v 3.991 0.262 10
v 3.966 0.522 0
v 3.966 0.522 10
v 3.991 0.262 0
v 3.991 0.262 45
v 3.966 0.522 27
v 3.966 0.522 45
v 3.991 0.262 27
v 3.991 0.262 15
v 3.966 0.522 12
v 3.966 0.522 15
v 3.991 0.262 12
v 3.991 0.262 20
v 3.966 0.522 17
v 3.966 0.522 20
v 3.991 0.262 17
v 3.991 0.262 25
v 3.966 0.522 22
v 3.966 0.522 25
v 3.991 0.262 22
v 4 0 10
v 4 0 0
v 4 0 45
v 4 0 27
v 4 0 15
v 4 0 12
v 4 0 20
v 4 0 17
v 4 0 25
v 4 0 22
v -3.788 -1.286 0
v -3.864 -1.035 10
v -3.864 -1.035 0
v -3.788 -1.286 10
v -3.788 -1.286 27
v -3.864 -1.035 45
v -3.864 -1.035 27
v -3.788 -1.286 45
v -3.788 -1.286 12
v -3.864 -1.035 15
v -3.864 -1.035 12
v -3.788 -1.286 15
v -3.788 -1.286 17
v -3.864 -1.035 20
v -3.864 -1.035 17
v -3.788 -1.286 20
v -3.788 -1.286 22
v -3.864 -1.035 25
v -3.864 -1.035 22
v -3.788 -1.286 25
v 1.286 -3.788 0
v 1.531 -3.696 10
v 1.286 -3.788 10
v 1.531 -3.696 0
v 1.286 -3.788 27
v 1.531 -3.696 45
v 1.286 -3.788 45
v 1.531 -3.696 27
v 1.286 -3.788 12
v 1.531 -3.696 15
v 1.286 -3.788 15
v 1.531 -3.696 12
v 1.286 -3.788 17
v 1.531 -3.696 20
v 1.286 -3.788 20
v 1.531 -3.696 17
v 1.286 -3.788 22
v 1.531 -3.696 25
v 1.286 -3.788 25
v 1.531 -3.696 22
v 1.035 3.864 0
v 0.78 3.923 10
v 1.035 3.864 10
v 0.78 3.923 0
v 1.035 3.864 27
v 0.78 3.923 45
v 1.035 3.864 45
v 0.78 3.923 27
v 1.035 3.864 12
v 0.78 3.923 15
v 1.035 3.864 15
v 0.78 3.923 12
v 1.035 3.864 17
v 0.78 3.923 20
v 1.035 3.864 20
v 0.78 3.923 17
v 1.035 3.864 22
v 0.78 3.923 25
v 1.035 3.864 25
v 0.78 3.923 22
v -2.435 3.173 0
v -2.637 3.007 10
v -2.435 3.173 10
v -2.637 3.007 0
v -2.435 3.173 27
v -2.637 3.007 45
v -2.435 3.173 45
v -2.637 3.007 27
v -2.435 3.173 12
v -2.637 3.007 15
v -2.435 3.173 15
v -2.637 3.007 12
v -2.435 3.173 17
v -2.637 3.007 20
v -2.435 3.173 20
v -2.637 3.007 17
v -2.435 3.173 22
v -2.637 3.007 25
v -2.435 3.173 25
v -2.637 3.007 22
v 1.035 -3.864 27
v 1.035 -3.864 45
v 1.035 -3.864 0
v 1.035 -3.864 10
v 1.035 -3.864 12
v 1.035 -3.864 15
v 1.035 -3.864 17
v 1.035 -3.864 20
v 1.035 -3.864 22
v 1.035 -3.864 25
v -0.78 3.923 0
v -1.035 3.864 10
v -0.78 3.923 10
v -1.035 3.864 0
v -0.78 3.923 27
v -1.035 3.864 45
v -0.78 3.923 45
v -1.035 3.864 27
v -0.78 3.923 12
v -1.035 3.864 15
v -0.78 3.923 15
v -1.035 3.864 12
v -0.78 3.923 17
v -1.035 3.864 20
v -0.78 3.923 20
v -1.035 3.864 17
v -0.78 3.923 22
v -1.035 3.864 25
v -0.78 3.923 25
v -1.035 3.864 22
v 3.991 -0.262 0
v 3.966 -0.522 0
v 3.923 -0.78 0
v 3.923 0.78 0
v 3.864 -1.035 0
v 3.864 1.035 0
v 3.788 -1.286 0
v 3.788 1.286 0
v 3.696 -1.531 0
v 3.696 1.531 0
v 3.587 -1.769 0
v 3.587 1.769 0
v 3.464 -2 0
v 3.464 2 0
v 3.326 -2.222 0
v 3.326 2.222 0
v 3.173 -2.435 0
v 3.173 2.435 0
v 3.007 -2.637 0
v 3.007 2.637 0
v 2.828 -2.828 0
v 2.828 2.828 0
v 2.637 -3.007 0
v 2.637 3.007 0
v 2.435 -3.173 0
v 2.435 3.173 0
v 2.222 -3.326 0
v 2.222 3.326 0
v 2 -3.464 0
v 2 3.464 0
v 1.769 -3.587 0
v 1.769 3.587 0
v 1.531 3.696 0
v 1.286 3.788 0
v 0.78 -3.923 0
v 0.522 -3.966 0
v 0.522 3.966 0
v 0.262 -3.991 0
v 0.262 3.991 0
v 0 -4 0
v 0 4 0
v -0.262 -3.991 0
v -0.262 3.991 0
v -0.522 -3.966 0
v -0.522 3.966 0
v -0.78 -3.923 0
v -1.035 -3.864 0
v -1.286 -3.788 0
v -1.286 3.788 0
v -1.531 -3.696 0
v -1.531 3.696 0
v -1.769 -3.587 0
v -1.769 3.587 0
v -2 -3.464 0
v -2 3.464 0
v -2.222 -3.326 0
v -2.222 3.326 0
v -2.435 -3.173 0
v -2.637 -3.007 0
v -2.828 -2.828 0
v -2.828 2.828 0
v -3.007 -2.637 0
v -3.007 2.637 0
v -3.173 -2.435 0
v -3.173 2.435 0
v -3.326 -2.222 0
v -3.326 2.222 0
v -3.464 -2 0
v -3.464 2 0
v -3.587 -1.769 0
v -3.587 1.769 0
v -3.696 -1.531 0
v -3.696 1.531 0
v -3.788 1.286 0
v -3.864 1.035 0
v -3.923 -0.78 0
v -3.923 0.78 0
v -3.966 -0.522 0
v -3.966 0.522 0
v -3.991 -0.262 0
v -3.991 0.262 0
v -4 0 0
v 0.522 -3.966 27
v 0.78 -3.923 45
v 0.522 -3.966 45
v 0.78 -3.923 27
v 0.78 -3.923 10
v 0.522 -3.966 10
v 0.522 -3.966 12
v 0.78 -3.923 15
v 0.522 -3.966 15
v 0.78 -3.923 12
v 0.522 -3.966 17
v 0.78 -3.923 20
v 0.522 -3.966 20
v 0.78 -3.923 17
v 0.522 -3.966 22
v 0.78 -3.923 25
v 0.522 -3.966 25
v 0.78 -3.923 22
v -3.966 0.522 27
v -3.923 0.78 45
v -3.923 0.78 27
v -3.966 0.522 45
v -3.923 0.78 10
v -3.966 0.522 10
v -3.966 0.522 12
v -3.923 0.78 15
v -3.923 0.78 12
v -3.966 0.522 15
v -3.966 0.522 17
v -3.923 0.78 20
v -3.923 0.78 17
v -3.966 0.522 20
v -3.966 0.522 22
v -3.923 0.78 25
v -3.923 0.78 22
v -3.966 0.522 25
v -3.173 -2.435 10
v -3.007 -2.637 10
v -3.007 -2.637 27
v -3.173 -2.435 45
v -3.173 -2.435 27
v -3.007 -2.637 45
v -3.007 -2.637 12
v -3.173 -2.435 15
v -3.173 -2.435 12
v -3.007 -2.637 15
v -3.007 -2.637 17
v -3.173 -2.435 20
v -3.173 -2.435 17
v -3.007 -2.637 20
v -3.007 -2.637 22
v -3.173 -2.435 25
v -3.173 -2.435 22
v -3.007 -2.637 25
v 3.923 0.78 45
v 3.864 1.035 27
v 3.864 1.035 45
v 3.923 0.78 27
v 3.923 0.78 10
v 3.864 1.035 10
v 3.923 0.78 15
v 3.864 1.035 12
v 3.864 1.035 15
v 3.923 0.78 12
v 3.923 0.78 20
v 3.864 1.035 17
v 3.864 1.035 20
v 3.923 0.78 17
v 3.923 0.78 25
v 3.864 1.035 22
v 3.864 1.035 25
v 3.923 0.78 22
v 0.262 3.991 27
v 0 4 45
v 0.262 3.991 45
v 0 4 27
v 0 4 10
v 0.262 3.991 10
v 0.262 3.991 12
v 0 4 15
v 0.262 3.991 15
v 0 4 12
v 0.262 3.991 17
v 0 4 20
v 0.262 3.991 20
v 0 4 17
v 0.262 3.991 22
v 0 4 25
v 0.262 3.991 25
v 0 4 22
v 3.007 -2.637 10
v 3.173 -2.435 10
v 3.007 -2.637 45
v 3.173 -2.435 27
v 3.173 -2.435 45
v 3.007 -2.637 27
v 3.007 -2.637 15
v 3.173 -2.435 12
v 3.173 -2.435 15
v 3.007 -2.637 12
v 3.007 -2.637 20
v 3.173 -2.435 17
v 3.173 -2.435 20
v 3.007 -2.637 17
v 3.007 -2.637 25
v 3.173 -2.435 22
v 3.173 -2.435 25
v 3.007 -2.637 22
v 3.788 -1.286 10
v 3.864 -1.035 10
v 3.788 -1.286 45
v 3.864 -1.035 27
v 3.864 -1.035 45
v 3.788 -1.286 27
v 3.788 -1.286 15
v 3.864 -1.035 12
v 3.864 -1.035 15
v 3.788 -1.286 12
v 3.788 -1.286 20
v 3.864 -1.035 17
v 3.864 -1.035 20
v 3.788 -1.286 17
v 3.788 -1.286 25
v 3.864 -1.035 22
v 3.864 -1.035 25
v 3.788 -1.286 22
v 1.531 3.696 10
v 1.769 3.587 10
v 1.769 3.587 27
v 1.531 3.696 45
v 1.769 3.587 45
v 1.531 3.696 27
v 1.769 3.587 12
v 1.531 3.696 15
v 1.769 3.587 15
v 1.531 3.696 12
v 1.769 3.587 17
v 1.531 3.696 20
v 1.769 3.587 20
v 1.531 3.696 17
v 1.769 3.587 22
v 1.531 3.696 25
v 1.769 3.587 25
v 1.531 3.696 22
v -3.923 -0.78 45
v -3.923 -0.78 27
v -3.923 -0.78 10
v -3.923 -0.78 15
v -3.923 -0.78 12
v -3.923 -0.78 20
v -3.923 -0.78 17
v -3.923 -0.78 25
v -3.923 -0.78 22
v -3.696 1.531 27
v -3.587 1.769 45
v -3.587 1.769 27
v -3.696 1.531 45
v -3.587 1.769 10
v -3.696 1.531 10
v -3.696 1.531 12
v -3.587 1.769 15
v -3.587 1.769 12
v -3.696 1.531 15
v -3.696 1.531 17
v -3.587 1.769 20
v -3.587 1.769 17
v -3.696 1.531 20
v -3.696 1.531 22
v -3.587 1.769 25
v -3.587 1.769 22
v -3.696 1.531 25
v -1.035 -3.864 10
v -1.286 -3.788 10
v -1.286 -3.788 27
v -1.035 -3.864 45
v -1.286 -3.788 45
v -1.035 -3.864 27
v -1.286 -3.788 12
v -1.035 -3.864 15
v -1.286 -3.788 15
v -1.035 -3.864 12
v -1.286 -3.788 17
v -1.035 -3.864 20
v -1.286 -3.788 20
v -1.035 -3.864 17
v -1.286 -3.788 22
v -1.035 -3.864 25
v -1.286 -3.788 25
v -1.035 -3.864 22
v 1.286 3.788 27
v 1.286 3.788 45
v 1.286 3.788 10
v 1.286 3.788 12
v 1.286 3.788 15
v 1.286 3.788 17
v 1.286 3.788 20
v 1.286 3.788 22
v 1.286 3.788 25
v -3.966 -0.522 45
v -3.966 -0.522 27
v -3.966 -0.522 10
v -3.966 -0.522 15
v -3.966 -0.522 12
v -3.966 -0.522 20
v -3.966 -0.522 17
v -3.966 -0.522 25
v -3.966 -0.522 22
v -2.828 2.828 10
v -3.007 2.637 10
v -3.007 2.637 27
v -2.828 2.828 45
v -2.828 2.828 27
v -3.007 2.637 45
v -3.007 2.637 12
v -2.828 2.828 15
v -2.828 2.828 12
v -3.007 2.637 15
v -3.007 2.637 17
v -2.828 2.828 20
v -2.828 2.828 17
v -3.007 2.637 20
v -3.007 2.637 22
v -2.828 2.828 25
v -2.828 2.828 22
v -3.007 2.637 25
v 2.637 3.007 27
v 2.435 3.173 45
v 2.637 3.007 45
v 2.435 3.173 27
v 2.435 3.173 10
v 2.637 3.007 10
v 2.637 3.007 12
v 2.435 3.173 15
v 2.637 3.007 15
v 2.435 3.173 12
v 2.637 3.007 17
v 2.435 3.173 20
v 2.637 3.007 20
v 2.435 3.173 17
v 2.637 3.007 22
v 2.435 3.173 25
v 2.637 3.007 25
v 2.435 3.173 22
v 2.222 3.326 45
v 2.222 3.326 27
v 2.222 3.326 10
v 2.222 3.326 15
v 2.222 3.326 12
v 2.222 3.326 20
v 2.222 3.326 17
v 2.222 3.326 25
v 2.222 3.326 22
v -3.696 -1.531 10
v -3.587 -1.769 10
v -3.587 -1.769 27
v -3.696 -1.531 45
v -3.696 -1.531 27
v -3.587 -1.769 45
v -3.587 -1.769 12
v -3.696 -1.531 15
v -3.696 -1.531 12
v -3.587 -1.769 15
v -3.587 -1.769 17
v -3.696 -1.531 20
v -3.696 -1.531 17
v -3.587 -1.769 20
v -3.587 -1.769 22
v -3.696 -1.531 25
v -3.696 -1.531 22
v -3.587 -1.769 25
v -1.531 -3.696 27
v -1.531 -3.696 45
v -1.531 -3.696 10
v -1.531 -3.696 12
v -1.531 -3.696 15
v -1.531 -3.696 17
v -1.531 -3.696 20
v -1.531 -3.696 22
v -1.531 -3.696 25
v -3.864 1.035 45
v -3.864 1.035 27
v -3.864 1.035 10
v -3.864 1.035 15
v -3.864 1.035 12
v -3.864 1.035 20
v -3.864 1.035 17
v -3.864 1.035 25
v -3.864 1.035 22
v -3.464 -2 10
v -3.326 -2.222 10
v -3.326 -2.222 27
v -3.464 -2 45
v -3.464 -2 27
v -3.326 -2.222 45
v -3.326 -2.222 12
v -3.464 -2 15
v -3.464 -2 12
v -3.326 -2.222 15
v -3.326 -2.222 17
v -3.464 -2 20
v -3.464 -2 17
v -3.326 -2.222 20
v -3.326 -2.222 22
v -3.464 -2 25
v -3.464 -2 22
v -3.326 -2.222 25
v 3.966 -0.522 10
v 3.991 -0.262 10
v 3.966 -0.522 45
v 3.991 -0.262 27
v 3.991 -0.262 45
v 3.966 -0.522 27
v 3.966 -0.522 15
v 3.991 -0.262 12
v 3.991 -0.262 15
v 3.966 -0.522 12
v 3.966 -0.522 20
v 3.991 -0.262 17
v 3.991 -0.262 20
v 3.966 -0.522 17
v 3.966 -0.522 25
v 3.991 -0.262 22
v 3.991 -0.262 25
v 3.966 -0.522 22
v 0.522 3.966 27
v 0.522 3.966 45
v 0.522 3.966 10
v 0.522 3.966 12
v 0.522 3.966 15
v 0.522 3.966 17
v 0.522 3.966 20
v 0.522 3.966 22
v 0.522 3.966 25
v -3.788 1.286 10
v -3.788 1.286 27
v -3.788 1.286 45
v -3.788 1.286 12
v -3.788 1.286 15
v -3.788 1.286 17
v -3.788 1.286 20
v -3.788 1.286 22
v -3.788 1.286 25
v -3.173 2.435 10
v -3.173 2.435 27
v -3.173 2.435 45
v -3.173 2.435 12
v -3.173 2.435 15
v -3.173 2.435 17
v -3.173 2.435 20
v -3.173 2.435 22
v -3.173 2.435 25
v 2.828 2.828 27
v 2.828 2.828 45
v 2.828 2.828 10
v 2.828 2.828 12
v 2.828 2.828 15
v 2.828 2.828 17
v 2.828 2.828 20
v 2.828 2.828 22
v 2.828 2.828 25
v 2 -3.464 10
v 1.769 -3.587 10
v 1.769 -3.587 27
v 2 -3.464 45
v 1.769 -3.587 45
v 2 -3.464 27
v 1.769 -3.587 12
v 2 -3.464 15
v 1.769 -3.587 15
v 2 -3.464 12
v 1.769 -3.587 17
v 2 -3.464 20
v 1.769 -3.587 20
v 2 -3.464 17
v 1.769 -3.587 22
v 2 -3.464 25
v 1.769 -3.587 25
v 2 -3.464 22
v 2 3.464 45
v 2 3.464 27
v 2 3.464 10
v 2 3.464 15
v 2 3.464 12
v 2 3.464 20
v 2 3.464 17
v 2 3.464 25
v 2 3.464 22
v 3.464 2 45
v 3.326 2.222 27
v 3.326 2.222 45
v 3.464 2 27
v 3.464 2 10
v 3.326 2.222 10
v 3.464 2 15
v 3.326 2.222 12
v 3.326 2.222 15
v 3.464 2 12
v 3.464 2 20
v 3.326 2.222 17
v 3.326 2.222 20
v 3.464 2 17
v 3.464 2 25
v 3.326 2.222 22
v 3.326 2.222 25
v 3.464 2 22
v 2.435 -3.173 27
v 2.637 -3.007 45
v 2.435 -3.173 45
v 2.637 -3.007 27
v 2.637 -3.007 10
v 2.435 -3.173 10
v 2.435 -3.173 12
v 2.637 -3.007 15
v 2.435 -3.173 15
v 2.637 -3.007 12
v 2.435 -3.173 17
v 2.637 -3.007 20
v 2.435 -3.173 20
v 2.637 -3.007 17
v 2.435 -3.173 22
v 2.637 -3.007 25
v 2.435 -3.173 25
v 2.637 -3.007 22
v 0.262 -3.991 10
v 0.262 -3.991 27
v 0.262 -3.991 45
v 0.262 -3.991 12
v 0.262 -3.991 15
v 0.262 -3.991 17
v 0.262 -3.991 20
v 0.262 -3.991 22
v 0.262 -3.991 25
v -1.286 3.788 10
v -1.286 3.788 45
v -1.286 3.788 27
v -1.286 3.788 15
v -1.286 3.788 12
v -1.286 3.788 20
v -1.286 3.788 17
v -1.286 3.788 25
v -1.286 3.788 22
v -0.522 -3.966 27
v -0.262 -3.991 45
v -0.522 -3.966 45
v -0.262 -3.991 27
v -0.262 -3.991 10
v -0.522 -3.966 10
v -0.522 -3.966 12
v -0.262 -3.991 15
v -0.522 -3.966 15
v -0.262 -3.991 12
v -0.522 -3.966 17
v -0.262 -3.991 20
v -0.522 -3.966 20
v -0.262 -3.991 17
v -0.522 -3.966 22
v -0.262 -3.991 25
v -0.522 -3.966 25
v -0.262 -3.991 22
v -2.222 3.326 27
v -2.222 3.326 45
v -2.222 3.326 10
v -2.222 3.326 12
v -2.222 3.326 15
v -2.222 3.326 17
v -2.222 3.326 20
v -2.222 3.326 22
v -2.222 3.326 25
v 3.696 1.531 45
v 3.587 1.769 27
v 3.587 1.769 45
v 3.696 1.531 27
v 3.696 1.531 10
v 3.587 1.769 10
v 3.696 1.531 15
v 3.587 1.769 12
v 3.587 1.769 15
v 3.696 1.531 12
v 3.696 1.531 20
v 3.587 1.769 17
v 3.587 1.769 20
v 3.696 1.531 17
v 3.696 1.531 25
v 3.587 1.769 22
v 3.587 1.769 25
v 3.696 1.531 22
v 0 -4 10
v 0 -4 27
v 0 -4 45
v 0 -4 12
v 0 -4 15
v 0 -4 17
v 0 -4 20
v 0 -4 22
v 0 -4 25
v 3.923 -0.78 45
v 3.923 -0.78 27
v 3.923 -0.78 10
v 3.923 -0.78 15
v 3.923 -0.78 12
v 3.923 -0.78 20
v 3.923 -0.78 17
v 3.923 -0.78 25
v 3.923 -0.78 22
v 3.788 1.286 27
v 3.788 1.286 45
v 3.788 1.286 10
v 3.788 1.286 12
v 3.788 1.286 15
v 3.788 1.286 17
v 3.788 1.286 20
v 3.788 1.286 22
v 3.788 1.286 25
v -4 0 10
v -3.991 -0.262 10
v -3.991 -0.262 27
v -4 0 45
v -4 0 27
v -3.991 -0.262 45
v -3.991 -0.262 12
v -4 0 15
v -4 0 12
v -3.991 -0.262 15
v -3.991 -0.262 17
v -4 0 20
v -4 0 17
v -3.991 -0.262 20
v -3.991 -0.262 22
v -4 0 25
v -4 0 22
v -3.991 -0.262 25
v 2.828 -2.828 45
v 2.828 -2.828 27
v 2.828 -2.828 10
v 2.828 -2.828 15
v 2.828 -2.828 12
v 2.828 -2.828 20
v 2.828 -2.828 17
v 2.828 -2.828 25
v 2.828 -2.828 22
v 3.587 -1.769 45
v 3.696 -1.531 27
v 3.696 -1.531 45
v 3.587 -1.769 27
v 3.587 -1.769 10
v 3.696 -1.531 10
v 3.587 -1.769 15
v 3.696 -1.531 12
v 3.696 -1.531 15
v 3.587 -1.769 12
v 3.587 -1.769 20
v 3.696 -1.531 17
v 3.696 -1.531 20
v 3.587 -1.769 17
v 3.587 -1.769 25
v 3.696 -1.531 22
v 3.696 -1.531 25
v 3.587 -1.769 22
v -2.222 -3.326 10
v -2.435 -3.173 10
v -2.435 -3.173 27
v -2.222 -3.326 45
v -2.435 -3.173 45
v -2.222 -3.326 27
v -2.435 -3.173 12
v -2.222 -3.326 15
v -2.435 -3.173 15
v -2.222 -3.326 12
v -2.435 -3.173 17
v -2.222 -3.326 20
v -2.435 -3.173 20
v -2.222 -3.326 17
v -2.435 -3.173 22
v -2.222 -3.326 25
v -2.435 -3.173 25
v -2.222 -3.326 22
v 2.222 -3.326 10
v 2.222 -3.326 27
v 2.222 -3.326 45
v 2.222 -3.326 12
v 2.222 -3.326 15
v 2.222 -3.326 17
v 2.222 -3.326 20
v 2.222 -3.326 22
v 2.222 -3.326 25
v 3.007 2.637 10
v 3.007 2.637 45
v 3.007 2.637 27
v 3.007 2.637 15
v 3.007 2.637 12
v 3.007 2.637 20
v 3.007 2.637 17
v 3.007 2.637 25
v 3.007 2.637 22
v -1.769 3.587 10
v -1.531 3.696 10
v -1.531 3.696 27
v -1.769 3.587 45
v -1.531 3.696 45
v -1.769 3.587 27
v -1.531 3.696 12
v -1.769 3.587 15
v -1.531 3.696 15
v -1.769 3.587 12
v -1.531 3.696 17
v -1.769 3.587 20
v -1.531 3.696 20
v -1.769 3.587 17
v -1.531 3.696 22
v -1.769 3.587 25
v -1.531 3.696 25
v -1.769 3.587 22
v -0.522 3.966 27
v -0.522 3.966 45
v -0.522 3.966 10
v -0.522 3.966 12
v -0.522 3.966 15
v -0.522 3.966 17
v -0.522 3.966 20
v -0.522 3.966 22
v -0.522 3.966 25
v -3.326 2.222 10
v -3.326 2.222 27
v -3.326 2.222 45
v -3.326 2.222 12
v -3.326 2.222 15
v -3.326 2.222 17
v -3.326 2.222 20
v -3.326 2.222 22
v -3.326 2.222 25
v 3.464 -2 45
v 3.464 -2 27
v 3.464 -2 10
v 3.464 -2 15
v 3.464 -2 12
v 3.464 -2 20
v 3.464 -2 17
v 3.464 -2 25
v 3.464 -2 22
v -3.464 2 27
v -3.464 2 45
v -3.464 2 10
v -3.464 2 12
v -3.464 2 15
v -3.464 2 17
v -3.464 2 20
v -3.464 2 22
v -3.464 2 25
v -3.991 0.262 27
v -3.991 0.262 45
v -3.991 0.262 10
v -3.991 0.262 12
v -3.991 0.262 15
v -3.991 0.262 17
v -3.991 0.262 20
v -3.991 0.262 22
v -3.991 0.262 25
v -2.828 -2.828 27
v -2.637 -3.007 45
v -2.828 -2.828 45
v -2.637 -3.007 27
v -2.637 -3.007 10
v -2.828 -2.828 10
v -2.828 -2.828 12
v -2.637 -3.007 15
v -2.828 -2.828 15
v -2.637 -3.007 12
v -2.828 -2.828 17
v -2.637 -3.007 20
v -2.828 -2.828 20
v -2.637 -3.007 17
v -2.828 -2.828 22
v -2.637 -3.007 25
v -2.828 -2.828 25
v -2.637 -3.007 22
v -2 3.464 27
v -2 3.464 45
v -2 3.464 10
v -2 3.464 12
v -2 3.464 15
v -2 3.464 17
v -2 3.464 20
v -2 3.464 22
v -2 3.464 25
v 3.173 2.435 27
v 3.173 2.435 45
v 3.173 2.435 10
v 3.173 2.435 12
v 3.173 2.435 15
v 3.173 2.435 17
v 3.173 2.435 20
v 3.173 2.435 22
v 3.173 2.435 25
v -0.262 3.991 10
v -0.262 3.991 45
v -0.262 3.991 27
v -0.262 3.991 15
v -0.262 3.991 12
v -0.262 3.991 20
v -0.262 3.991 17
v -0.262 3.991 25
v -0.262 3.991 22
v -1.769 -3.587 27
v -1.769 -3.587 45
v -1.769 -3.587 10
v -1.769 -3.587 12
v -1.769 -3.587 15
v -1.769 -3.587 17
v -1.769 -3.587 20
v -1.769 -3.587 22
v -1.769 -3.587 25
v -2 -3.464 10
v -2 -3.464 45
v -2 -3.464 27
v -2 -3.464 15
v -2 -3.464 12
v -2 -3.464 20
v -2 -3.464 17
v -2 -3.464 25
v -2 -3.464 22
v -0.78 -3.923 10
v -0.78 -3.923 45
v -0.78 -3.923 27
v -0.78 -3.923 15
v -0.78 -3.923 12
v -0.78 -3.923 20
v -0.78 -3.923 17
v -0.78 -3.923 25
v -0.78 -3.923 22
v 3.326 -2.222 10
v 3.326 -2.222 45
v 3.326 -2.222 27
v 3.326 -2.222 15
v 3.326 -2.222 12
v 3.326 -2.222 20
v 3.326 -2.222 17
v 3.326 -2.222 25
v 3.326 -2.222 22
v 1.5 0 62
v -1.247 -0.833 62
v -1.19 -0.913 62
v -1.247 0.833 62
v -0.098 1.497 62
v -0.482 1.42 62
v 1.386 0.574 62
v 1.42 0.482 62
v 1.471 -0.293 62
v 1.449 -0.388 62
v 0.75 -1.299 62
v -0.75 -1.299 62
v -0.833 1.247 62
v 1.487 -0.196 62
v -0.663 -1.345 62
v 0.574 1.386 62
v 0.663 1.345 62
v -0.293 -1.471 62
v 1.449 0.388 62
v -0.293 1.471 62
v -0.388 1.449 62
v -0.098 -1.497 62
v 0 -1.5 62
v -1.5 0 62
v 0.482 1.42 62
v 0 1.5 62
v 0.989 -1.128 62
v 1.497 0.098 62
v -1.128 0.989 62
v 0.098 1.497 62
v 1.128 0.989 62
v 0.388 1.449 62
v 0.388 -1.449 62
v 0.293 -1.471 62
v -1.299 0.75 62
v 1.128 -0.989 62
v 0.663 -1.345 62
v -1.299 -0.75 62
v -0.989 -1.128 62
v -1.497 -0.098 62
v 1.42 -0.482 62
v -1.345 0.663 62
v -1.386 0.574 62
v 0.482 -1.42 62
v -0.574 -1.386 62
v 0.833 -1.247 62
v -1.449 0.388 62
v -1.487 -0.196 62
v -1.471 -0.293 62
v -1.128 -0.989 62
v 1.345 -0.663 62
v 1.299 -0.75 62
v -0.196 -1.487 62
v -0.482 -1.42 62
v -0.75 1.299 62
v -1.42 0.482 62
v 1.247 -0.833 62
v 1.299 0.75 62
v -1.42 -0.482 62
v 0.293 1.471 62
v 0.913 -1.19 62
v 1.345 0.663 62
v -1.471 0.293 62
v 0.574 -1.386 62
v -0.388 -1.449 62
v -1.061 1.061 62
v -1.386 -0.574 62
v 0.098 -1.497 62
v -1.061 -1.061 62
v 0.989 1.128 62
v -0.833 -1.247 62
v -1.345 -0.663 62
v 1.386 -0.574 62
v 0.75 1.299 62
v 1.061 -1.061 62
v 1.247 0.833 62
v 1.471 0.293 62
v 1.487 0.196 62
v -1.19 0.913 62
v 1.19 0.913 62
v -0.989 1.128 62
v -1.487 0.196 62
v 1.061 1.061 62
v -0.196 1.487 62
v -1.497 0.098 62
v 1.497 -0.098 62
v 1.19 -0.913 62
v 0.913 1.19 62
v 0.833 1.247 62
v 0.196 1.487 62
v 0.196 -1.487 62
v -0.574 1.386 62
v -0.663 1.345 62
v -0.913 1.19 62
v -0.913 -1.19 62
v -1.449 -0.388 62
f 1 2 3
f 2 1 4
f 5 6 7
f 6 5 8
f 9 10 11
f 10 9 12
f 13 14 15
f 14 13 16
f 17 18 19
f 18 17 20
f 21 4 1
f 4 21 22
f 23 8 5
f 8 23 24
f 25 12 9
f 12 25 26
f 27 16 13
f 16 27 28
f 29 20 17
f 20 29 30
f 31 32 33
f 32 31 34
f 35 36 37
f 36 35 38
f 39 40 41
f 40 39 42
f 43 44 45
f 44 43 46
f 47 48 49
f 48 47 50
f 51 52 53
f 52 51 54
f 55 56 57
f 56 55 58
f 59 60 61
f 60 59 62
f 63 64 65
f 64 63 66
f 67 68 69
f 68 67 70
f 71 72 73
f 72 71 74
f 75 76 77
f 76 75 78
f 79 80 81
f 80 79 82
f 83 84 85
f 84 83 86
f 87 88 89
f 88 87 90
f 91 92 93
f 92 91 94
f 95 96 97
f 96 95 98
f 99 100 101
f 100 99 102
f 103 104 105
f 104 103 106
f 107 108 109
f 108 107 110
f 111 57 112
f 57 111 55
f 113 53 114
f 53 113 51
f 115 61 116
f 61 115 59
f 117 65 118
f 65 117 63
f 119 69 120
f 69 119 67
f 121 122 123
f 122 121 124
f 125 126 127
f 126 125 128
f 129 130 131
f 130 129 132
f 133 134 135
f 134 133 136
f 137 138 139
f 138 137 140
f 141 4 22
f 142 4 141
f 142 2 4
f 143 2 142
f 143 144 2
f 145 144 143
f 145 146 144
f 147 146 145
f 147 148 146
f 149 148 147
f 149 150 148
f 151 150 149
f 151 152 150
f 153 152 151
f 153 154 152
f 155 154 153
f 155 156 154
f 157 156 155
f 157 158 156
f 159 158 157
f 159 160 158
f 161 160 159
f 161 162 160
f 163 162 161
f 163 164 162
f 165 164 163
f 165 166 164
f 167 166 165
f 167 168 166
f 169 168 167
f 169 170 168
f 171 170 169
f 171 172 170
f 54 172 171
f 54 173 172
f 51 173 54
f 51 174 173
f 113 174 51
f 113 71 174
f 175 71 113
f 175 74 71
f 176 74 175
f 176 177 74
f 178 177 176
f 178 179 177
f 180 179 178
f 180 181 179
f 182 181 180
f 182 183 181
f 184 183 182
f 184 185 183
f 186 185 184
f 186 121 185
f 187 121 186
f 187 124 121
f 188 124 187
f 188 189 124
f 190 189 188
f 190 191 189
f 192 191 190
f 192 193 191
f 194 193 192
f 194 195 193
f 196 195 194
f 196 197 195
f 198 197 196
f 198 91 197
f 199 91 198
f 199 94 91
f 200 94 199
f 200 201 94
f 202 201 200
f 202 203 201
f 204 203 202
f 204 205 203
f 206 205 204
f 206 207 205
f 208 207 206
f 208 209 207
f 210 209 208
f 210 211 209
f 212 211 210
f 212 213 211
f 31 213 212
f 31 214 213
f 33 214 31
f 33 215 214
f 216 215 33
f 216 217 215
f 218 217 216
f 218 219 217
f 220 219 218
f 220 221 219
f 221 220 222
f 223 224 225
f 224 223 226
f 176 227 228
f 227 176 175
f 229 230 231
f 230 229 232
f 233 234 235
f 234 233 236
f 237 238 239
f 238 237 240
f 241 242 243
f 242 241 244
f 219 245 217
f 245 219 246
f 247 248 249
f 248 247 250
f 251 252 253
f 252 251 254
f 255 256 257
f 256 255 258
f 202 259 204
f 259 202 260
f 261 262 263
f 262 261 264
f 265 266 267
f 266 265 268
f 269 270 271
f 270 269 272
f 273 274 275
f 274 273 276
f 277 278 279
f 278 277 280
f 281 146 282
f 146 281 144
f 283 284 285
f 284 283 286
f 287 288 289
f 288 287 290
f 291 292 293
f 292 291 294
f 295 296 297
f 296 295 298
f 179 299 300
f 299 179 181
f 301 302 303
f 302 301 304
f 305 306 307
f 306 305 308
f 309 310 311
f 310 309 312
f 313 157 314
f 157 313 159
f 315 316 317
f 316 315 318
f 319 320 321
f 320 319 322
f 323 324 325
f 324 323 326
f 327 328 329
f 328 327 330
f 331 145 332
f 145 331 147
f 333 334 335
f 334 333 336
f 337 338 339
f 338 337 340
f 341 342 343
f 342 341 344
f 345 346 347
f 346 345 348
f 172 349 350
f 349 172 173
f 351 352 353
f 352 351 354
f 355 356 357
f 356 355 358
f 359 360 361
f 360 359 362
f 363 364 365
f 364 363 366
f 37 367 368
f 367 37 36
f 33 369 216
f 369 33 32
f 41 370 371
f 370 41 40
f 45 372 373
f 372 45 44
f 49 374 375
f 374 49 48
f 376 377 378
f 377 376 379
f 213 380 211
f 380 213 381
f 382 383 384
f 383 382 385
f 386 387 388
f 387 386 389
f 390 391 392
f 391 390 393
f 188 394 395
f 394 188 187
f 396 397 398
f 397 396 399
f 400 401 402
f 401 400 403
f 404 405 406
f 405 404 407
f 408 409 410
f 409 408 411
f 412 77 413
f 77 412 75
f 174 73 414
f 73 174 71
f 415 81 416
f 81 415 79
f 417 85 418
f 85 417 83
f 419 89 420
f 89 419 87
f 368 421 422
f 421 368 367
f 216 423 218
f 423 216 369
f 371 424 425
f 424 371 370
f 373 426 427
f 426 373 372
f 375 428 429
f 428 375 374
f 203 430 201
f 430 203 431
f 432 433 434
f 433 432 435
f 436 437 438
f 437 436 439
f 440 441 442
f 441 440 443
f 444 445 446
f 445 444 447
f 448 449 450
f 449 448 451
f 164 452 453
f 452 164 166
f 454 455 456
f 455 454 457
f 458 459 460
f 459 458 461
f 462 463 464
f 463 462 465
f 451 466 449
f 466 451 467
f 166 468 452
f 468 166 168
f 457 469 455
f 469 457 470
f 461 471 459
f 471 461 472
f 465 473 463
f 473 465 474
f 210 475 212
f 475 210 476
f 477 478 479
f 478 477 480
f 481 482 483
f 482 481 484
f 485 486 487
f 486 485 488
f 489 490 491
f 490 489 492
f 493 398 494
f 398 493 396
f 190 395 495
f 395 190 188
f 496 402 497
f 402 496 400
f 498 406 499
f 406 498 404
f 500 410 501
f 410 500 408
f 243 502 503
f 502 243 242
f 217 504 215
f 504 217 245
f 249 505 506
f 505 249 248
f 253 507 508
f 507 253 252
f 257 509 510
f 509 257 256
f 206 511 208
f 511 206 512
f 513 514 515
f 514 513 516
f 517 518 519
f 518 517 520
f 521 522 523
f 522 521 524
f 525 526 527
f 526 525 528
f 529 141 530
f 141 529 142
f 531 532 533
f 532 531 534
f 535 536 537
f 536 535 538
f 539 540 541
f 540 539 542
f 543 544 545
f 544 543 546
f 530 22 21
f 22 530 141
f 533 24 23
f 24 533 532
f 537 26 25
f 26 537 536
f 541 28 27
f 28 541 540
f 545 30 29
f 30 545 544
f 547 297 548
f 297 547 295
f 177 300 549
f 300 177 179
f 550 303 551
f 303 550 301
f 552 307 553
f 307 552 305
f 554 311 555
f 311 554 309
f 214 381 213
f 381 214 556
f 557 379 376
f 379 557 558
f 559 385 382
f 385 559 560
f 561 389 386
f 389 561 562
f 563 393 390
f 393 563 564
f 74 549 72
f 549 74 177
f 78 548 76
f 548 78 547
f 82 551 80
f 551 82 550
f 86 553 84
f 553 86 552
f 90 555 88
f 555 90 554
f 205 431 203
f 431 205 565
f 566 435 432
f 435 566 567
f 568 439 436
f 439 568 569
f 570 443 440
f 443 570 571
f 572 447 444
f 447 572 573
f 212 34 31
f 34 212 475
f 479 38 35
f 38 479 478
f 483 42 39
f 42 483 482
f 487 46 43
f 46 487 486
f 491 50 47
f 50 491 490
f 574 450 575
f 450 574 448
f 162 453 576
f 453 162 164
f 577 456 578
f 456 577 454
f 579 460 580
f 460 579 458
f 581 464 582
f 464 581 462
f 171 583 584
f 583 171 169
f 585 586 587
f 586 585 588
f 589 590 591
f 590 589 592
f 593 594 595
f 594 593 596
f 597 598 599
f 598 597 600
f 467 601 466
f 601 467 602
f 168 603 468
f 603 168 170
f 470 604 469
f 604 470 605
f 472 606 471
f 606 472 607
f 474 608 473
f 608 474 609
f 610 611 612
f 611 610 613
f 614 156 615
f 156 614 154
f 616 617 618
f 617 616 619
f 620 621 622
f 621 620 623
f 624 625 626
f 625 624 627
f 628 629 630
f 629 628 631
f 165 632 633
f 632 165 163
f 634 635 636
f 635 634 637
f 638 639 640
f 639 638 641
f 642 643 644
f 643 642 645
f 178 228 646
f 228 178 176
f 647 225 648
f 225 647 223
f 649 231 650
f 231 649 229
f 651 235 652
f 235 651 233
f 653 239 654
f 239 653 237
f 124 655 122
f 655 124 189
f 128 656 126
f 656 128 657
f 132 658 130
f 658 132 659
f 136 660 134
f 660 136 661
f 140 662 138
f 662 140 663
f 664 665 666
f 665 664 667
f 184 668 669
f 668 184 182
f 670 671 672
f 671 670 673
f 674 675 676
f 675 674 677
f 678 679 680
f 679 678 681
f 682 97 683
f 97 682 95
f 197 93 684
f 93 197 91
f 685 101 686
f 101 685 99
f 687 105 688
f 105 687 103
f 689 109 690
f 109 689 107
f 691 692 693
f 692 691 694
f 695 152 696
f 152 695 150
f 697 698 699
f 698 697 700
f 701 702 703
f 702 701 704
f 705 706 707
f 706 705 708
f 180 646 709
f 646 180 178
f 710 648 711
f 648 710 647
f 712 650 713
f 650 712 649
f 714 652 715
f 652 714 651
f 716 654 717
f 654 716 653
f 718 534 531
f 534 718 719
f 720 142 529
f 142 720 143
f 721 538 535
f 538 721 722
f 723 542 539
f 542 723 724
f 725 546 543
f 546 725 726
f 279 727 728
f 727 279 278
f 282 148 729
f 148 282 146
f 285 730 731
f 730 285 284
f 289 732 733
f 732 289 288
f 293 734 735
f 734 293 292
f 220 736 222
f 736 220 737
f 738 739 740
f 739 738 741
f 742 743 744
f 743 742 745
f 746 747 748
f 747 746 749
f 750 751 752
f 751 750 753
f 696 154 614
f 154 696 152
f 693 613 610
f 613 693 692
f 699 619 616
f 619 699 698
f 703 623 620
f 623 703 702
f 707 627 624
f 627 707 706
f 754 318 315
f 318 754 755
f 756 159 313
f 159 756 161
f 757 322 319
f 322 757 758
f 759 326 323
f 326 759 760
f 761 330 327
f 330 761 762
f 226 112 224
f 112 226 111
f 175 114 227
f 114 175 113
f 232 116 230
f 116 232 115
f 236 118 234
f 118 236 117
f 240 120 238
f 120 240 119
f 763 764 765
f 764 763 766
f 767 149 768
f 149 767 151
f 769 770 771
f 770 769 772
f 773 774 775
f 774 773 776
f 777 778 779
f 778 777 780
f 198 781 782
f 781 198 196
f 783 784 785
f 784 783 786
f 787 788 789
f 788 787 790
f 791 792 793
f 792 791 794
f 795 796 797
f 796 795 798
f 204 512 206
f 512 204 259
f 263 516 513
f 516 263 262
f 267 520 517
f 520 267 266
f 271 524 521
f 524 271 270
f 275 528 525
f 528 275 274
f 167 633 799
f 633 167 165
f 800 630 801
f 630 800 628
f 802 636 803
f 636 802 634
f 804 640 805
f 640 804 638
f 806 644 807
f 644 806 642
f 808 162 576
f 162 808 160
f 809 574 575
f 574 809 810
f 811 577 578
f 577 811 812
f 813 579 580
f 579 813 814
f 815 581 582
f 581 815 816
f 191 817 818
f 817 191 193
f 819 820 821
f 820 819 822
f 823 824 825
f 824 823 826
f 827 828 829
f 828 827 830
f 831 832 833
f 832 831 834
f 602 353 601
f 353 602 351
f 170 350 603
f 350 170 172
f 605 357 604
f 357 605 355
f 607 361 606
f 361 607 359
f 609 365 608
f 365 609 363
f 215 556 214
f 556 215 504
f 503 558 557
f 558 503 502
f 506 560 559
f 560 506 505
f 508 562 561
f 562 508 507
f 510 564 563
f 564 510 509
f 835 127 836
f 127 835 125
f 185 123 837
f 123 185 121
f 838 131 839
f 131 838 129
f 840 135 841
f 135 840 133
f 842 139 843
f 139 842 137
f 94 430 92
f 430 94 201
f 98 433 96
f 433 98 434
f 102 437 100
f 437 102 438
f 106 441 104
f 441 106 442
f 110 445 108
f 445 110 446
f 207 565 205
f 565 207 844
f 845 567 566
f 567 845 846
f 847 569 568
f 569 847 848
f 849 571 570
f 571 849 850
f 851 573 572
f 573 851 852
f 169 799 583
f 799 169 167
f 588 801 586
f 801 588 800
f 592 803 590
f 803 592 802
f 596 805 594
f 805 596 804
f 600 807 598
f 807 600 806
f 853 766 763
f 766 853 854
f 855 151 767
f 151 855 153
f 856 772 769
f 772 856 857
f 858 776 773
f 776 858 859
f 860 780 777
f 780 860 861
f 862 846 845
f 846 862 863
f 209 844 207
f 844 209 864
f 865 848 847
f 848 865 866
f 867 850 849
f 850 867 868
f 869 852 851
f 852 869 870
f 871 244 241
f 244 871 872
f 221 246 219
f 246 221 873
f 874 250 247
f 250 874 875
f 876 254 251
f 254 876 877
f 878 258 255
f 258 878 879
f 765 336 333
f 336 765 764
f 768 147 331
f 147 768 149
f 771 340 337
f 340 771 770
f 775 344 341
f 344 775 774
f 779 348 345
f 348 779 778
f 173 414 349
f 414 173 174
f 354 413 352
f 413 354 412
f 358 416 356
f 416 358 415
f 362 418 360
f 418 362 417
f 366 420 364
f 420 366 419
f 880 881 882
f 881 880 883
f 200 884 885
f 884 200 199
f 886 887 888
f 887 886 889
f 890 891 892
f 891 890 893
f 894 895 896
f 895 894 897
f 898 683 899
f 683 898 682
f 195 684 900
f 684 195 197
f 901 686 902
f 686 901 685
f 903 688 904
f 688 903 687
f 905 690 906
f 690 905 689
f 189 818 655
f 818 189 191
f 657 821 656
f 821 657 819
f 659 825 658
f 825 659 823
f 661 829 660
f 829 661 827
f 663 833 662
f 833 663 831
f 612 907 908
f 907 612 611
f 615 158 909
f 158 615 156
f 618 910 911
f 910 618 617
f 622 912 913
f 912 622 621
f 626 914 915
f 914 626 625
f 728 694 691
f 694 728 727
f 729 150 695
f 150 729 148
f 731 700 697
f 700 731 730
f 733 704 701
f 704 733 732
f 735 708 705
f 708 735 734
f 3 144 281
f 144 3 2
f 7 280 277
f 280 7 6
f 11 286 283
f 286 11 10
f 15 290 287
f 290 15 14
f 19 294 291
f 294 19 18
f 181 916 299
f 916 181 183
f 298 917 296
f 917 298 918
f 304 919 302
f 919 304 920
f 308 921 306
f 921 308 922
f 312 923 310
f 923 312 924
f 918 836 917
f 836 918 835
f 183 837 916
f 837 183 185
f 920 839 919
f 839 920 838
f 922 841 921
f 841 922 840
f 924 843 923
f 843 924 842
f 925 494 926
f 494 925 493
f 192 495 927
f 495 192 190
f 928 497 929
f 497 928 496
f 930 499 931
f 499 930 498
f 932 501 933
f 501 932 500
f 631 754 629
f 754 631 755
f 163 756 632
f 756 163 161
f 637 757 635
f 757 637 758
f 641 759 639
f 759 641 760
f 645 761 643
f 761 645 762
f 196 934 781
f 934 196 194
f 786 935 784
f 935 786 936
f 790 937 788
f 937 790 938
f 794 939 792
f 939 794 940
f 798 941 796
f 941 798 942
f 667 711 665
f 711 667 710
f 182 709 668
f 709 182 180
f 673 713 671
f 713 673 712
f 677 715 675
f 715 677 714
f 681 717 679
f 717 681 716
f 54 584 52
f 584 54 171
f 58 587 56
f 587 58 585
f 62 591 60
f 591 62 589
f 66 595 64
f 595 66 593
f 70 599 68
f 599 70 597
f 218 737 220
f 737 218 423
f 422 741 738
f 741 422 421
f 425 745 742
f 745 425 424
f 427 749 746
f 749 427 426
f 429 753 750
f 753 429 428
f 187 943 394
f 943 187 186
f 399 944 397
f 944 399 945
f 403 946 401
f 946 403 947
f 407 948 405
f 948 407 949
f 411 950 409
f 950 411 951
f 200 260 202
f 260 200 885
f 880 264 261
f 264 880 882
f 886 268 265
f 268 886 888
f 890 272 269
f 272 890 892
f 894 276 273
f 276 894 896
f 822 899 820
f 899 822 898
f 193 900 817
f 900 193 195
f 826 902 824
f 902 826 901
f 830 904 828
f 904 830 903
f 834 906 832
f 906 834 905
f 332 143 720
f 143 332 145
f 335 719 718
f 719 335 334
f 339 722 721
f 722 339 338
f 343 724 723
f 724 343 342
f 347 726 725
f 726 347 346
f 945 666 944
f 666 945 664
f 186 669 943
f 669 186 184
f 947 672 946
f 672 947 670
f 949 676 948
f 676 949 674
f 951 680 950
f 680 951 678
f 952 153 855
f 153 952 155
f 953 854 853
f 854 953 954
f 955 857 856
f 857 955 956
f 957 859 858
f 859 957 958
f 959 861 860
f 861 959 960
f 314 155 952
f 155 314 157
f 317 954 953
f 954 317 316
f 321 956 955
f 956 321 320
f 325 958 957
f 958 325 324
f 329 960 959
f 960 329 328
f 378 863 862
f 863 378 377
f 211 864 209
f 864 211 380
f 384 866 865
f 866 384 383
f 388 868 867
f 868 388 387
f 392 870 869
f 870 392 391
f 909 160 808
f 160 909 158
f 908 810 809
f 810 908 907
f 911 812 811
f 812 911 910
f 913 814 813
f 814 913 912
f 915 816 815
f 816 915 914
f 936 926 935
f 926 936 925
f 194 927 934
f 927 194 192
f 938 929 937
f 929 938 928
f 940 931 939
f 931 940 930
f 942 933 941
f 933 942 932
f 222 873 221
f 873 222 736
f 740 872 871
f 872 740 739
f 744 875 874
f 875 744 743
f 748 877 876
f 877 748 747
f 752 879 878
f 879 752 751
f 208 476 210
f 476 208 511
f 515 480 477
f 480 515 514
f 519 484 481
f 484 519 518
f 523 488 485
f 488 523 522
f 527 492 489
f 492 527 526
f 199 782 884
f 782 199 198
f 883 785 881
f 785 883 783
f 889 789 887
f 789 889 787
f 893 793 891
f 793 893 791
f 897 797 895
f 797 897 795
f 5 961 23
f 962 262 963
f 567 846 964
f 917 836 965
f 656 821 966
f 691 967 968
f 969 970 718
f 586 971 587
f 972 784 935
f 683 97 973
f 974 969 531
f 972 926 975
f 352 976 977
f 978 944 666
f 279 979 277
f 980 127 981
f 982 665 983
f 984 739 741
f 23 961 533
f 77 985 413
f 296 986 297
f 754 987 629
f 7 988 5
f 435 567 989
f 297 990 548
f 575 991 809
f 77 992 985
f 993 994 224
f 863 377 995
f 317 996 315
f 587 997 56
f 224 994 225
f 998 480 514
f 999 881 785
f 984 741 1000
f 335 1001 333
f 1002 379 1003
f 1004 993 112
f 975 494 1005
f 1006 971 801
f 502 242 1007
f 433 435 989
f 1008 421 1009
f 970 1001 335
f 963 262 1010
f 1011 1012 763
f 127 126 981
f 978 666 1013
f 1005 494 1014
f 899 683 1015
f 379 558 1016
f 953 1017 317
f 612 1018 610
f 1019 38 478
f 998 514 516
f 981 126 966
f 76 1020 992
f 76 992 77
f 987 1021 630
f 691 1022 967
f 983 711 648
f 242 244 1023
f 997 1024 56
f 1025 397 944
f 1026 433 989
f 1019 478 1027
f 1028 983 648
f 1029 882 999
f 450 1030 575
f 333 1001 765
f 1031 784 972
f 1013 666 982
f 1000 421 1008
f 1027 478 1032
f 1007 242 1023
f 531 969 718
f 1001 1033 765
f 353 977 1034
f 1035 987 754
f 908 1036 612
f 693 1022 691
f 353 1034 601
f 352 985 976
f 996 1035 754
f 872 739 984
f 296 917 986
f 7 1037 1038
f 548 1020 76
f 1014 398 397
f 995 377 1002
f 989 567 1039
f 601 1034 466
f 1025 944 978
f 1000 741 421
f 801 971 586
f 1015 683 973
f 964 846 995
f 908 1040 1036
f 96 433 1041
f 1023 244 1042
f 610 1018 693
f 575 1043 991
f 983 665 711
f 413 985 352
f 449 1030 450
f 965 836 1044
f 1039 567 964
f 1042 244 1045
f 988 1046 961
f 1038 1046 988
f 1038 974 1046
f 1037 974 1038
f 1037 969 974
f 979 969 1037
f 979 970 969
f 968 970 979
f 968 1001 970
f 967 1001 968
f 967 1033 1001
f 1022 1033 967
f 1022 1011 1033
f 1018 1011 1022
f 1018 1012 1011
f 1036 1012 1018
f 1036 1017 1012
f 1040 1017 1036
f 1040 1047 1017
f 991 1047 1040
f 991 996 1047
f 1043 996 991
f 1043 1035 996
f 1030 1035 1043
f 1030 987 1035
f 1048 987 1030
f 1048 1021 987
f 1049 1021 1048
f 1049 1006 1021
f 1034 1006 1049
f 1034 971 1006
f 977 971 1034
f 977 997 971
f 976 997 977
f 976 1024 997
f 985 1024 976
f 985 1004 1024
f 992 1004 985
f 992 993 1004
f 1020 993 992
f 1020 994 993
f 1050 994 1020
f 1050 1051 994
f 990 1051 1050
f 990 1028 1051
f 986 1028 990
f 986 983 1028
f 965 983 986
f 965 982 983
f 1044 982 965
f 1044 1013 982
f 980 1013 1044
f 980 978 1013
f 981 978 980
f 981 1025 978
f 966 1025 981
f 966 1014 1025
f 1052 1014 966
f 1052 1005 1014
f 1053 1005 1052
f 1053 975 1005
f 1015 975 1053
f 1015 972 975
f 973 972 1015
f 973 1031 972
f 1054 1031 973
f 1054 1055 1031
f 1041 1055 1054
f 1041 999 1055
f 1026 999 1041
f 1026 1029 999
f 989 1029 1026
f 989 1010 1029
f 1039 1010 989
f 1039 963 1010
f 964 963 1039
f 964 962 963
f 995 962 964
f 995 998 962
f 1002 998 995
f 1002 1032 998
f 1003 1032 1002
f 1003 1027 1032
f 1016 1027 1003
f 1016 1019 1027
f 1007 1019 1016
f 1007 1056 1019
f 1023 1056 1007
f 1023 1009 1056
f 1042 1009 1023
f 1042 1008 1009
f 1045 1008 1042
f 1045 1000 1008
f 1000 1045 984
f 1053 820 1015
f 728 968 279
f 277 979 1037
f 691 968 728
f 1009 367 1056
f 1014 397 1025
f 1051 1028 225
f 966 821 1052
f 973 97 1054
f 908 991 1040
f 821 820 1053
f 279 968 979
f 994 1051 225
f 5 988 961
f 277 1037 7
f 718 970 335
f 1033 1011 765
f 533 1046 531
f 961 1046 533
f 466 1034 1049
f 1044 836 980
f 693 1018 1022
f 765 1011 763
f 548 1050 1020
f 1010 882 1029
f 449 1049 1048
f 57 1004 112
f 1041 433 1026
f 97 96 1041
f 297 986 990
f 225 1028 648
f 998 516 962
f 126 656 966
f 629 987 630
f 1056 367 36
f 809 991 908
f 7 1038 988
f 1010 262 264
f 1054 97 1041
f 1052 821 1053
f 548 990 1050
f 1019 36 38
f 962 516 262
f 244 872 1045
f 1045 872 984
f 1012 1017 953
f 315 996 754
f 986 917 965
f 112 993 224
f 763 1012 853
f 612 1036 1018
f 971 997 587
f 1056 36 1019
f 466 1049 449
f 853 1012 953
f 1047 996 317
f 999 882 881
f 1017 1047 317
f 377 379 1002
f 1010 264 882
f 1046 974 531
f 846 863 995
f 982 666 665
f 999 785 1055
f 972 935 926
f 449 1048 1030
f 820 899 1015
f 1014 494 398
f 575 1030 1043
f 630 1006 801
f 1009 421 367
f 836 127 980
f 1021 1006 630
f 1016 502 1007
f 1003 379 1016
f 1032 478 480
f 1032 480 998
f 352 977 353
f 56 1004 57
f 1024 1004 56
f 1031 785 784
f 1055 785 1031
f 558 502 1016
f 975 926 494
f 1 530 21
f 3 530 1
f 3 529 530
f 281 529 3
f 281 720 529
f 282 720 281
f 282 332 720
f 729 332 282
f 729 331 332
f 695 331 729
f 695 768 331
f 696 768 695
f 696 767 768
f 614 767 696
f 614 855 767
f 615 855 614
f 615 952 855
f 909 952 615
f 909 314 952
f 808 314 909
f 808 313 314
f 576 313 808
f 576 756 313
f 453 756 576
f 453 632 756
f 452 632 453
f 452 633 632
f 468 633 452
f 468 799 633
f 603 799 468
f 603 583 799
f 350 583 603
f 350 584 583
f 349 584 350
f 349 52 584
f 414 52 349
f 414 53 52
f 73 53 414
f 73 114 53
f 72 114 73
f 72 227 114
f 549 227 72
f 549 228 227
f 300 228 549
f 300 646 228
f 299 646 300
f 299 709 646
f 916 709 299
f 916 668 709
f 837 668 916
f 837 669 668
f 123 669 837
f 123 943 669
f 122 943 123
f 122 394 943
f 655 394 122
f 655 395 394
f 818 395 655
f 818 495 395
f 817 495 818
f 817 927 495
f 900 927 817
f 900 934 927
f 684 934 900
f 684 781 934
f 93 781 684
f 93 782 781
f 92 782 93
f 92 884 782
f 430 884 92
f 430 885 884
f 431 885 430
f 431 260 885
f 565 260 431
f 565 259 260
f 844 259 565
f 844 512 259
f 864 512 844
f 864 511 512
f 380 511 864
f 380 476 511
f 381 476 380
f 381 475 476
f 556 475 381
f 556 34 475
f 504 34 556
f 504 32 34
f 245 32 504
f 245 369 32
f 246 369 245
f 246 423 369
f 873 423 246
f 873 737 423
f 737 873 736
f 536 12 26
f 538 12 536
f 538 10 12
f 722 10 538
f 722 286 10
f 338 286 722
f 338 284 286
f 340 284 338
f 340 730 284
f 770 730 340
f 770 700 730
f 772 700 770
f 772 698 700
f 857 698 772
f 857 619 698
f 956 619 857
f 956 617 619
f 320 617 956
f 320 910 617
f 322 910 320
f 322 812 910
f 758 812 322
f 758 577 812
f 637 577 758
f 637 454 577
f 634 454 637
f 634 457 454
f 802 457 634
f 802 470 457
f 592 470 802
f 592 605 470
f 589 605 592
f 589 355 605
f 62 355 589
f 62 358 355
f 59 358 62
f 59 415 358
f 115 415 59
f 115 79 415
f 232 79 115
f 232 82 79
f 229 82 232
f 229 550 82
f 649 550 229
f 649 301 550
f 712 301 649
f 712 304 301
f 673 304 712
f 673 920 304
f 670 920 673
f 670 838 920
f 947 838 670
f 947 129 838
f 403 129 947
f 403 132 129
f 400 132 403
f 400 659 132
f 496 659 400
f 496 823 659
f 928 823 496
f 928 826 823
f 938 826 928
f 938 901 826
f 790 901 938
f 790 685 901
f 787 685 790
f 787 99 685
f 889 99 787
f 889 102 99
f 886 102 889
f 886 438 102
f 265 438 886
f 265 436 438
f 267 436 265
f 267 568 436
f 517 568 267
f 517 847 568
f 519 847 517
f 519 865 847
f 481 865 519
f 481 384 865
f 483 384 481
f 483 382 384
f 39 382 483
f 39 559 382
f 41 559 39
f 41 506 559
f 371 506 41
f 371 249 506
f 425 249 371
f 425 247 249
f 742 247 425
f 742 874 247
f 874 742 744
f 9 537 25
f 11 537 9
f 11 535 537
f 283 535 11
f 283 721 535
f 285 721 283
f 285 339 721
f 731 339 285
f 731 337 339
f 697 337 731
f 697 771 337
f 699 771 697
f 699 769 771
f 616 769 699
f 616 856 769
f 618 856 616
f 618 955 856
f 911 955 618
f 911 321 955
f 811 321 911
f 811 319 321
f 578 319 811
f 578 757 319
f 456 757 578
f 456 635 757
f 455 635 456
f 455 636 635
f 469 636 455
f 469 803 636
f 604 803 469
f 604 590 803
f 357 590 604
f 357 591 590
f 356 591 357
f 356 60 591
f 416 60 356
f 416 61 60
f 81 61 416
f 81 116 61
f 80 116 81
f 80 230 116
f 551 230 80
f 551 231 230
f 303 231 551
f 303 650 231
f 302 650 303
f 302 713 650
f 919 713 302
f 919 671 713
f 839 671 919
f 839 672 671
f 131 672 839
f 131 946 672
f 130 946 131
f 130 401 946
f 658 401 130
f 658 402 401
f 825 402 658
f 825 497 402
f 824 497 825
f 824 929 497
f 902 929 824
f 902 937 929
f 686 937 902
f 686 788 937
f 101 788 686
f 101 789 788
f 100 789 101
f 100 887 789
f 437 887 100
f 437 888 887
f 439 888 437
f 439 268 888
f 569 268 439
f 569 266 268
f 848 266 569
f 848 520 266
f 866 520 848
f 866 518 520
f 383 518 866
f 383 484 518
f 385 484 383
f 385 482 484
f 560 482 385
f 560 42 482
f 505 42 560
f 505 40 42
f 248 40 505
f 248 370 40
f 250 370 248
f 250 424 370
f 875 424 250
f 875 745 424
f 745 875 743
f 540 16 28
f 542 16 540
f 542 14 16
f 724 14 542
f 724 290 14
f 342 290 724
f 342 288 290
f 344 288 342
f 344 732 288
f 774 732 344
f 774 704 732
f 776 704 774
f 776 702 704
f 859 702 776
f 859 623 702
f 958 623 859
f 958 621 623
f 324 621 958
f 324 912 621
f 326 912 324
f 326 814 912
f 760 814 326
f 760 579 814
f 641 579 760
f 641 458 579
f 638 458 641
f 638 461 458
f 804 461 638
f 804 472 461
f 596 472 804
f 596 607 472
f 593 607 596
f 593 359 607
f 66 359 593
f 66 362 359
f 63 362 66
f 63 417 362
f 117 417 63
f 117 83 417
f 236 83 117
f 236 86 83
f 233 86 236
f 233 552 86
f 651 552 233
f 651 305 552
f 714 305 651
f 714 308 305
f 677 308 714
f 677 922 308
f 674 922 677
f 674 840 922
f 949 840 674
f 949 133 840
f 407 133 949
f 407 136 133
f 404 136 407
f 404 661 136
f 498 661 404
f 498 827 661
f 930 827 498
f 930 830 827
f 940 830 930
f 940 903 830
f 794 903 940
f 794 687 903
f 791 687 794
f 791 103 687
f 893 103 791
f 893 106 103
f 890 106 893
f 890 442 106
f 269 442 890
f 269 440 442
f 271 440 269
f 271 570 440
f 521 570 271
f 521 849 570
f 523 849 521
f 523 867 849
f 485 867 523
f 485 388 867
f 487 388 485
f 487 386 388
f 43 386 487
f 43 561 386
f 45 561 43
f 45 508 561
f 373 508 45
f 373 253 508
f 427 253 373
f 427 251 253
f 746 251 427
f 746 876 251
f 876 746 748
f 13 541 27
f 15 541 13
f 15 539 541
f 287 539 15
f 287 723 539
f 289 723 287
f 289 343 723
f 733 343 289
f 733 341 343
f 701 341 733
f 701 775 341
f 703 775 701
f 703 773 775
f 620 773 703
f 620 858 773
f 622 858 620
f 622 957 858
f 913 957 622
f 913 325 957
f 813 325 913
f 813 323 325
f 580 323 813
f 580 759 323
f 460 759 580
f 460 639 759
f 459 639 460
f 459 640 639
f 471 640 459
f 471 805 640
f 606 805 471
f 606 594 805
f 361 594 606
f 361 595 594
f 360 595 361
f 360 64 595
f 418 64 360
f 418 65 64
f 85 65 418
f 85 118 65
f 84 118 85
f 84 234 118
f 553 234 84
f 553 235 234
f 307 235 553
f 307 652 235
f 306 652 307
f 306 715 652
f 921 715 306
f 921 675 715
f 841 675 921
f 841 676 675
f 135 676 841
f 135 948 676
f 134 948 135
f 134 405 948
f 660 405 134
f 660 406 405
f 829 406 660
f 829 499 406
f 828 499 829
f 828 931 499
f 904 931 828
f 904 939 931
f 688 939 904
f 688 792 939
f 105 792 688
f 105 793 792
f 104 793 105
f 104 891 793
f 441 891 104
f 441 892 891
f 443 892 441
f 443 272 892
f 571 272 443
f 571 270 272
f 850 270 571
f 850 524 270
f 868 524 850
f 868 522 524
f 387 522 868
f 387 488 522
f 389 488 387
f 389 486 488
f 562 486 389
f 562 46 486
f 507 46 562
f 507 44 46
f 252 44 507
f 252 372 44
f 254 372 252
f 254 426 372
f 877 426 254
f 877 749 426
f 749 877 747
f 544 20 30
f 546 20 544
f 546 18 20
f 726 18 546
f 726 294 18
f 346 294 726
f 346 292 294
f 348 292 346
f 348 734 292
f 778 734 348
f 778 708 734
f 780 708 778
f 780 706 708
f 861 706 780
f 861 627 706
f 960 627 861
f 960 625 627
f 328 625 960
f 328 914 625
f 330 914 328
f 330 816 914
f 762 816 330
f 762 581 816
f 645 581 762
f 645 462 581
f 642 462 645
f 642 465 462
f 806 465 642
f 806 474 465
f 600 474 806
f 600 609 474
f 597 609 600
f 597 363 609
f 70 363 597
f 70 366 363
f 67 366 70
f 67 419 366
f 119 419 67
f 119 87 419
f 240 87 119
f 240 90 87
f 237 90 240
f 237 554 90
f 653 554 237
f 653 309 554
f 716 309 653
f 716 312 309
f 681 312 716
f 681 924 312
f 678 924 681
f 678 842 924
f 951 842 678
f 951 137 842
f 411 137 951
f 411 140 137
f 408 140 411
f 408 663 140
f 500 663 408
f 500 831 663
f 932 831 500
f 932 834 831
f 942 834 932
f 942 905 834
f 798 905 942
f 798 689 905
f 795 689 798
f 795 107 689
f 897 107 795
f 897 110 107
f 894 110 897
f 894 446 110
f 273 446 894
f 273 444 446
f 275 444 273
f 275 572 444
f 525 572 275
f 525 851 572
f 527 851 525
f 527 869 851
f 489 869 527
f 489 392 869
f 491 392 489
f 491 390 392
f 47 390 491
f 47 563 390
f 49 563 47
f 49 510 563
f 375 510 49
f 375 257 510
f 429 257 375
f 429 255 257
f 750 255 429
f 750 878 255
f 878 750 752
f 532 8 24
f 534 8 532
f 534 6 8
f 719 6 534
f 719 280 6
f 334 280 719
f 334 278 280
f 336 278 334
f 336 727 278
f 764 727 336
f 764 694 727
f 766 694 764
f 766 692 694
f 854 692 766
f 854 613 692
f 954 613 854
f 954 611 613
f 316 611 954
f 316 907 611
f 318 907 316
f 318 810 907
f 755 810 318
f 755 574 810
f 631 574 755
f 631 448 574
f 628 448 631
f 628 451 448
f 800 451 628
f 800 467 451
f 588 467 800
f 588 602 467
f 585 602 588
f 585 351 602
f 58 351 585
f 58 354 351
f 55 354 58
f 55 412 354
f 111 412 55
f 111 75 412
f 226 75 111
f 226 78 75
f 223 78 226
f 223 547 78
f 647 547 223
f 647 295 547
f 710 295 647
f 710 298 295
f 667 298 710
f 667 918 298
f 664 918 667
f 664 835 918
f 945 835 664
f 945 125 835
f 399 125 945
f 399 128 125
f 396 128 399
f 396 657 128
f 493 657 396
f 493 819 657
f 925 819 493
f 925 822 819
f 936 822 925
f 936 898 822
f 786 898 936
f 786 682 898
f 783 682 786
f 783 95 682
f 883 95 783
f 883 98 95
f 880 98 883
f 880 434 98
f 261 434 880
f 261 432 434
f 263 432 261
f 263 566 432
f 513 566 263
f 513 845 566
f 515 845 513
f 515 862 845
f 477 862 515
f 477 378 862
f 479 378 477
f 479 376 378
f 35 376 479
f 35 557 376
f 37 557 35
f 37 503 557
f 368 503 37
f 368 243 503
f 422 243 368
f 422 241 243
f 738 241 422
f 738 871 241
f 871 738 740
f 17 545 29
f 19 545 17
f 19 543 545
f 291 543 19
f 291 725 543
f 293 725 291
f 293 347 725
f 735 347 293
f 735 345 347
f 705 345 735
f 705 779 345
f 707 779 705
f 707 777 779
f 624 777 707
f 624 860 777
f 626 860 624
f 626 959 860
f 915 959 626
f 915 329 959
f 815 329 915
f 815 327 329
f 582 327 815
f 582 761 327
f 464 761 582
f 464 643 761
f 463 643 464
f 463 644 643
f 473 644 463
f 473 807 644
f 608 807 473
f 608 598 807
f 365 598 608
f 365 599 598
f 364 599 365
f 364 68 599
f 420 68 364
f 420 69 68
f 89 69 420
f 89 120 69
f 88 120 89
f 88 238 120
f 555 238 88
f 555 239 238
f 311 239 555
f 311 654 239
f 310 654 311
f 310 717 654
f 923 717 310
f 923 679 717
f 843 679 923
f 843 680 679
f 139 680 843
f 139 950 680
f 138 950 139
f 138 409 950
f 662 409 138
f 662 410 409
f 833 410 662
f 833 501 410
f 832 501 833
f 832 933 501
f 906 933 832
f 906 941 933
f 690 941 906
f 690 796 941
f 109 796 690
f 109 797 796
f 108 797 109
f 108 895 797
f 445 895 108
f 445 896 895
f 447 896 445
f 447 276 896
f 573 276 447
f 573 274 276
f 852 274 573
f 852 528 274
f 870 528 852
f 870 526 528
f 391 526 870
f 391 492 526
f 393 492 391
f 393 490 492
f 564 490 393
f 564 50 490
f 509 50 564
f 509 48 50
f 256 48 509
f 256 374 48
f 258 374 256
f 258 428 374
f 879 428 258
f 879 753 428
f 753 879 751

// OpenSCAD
// Pestle for grinding tissue in a 1.5 mL microcentrifuge tube
// Printed upright: handle at the bottom, tip pointing up.

$fn = 96;

// ---- Dimensions (mm) ----
handle_d      = 8;    // handle diameter
handle_top_z  = 45;   // handle height / cone start
tip_min_d     = 3;    // cone tip diameter / sphere diameter
tip_centre_z  = 62;   // sphere centre height
groove_count  = 4;    // number of circumferential grooves
groove_w      = 2;    // groove width (Z)
groove_d      = 1;    // groove depth from outer surface
groove_zs     = [10, 15, 20, 25]; // groove centre heights

eps           = 0.5;  // cutter overshoot

difference() {
    union() {
        // Handle
        cylinder(d = handle_d, h = handle_top_z);
        // Cone
        translate([0, 0, handle_top_z])
            cylinder(d1 = handle_d, d2 = tip_min_d, h = tip_centre_z - handle_top_z);
        // Rounded tip
        translate([0, 0, tip_centre_z - 1.5])
            sphere(d = tip_min_d);
    }

    // Grip grooves
    for (z = groove_zs)
        translate([0, 0, z])
            cylinder(d = handle_d + 2 * groove_d, h = groove_w, $fn = 96);
}
